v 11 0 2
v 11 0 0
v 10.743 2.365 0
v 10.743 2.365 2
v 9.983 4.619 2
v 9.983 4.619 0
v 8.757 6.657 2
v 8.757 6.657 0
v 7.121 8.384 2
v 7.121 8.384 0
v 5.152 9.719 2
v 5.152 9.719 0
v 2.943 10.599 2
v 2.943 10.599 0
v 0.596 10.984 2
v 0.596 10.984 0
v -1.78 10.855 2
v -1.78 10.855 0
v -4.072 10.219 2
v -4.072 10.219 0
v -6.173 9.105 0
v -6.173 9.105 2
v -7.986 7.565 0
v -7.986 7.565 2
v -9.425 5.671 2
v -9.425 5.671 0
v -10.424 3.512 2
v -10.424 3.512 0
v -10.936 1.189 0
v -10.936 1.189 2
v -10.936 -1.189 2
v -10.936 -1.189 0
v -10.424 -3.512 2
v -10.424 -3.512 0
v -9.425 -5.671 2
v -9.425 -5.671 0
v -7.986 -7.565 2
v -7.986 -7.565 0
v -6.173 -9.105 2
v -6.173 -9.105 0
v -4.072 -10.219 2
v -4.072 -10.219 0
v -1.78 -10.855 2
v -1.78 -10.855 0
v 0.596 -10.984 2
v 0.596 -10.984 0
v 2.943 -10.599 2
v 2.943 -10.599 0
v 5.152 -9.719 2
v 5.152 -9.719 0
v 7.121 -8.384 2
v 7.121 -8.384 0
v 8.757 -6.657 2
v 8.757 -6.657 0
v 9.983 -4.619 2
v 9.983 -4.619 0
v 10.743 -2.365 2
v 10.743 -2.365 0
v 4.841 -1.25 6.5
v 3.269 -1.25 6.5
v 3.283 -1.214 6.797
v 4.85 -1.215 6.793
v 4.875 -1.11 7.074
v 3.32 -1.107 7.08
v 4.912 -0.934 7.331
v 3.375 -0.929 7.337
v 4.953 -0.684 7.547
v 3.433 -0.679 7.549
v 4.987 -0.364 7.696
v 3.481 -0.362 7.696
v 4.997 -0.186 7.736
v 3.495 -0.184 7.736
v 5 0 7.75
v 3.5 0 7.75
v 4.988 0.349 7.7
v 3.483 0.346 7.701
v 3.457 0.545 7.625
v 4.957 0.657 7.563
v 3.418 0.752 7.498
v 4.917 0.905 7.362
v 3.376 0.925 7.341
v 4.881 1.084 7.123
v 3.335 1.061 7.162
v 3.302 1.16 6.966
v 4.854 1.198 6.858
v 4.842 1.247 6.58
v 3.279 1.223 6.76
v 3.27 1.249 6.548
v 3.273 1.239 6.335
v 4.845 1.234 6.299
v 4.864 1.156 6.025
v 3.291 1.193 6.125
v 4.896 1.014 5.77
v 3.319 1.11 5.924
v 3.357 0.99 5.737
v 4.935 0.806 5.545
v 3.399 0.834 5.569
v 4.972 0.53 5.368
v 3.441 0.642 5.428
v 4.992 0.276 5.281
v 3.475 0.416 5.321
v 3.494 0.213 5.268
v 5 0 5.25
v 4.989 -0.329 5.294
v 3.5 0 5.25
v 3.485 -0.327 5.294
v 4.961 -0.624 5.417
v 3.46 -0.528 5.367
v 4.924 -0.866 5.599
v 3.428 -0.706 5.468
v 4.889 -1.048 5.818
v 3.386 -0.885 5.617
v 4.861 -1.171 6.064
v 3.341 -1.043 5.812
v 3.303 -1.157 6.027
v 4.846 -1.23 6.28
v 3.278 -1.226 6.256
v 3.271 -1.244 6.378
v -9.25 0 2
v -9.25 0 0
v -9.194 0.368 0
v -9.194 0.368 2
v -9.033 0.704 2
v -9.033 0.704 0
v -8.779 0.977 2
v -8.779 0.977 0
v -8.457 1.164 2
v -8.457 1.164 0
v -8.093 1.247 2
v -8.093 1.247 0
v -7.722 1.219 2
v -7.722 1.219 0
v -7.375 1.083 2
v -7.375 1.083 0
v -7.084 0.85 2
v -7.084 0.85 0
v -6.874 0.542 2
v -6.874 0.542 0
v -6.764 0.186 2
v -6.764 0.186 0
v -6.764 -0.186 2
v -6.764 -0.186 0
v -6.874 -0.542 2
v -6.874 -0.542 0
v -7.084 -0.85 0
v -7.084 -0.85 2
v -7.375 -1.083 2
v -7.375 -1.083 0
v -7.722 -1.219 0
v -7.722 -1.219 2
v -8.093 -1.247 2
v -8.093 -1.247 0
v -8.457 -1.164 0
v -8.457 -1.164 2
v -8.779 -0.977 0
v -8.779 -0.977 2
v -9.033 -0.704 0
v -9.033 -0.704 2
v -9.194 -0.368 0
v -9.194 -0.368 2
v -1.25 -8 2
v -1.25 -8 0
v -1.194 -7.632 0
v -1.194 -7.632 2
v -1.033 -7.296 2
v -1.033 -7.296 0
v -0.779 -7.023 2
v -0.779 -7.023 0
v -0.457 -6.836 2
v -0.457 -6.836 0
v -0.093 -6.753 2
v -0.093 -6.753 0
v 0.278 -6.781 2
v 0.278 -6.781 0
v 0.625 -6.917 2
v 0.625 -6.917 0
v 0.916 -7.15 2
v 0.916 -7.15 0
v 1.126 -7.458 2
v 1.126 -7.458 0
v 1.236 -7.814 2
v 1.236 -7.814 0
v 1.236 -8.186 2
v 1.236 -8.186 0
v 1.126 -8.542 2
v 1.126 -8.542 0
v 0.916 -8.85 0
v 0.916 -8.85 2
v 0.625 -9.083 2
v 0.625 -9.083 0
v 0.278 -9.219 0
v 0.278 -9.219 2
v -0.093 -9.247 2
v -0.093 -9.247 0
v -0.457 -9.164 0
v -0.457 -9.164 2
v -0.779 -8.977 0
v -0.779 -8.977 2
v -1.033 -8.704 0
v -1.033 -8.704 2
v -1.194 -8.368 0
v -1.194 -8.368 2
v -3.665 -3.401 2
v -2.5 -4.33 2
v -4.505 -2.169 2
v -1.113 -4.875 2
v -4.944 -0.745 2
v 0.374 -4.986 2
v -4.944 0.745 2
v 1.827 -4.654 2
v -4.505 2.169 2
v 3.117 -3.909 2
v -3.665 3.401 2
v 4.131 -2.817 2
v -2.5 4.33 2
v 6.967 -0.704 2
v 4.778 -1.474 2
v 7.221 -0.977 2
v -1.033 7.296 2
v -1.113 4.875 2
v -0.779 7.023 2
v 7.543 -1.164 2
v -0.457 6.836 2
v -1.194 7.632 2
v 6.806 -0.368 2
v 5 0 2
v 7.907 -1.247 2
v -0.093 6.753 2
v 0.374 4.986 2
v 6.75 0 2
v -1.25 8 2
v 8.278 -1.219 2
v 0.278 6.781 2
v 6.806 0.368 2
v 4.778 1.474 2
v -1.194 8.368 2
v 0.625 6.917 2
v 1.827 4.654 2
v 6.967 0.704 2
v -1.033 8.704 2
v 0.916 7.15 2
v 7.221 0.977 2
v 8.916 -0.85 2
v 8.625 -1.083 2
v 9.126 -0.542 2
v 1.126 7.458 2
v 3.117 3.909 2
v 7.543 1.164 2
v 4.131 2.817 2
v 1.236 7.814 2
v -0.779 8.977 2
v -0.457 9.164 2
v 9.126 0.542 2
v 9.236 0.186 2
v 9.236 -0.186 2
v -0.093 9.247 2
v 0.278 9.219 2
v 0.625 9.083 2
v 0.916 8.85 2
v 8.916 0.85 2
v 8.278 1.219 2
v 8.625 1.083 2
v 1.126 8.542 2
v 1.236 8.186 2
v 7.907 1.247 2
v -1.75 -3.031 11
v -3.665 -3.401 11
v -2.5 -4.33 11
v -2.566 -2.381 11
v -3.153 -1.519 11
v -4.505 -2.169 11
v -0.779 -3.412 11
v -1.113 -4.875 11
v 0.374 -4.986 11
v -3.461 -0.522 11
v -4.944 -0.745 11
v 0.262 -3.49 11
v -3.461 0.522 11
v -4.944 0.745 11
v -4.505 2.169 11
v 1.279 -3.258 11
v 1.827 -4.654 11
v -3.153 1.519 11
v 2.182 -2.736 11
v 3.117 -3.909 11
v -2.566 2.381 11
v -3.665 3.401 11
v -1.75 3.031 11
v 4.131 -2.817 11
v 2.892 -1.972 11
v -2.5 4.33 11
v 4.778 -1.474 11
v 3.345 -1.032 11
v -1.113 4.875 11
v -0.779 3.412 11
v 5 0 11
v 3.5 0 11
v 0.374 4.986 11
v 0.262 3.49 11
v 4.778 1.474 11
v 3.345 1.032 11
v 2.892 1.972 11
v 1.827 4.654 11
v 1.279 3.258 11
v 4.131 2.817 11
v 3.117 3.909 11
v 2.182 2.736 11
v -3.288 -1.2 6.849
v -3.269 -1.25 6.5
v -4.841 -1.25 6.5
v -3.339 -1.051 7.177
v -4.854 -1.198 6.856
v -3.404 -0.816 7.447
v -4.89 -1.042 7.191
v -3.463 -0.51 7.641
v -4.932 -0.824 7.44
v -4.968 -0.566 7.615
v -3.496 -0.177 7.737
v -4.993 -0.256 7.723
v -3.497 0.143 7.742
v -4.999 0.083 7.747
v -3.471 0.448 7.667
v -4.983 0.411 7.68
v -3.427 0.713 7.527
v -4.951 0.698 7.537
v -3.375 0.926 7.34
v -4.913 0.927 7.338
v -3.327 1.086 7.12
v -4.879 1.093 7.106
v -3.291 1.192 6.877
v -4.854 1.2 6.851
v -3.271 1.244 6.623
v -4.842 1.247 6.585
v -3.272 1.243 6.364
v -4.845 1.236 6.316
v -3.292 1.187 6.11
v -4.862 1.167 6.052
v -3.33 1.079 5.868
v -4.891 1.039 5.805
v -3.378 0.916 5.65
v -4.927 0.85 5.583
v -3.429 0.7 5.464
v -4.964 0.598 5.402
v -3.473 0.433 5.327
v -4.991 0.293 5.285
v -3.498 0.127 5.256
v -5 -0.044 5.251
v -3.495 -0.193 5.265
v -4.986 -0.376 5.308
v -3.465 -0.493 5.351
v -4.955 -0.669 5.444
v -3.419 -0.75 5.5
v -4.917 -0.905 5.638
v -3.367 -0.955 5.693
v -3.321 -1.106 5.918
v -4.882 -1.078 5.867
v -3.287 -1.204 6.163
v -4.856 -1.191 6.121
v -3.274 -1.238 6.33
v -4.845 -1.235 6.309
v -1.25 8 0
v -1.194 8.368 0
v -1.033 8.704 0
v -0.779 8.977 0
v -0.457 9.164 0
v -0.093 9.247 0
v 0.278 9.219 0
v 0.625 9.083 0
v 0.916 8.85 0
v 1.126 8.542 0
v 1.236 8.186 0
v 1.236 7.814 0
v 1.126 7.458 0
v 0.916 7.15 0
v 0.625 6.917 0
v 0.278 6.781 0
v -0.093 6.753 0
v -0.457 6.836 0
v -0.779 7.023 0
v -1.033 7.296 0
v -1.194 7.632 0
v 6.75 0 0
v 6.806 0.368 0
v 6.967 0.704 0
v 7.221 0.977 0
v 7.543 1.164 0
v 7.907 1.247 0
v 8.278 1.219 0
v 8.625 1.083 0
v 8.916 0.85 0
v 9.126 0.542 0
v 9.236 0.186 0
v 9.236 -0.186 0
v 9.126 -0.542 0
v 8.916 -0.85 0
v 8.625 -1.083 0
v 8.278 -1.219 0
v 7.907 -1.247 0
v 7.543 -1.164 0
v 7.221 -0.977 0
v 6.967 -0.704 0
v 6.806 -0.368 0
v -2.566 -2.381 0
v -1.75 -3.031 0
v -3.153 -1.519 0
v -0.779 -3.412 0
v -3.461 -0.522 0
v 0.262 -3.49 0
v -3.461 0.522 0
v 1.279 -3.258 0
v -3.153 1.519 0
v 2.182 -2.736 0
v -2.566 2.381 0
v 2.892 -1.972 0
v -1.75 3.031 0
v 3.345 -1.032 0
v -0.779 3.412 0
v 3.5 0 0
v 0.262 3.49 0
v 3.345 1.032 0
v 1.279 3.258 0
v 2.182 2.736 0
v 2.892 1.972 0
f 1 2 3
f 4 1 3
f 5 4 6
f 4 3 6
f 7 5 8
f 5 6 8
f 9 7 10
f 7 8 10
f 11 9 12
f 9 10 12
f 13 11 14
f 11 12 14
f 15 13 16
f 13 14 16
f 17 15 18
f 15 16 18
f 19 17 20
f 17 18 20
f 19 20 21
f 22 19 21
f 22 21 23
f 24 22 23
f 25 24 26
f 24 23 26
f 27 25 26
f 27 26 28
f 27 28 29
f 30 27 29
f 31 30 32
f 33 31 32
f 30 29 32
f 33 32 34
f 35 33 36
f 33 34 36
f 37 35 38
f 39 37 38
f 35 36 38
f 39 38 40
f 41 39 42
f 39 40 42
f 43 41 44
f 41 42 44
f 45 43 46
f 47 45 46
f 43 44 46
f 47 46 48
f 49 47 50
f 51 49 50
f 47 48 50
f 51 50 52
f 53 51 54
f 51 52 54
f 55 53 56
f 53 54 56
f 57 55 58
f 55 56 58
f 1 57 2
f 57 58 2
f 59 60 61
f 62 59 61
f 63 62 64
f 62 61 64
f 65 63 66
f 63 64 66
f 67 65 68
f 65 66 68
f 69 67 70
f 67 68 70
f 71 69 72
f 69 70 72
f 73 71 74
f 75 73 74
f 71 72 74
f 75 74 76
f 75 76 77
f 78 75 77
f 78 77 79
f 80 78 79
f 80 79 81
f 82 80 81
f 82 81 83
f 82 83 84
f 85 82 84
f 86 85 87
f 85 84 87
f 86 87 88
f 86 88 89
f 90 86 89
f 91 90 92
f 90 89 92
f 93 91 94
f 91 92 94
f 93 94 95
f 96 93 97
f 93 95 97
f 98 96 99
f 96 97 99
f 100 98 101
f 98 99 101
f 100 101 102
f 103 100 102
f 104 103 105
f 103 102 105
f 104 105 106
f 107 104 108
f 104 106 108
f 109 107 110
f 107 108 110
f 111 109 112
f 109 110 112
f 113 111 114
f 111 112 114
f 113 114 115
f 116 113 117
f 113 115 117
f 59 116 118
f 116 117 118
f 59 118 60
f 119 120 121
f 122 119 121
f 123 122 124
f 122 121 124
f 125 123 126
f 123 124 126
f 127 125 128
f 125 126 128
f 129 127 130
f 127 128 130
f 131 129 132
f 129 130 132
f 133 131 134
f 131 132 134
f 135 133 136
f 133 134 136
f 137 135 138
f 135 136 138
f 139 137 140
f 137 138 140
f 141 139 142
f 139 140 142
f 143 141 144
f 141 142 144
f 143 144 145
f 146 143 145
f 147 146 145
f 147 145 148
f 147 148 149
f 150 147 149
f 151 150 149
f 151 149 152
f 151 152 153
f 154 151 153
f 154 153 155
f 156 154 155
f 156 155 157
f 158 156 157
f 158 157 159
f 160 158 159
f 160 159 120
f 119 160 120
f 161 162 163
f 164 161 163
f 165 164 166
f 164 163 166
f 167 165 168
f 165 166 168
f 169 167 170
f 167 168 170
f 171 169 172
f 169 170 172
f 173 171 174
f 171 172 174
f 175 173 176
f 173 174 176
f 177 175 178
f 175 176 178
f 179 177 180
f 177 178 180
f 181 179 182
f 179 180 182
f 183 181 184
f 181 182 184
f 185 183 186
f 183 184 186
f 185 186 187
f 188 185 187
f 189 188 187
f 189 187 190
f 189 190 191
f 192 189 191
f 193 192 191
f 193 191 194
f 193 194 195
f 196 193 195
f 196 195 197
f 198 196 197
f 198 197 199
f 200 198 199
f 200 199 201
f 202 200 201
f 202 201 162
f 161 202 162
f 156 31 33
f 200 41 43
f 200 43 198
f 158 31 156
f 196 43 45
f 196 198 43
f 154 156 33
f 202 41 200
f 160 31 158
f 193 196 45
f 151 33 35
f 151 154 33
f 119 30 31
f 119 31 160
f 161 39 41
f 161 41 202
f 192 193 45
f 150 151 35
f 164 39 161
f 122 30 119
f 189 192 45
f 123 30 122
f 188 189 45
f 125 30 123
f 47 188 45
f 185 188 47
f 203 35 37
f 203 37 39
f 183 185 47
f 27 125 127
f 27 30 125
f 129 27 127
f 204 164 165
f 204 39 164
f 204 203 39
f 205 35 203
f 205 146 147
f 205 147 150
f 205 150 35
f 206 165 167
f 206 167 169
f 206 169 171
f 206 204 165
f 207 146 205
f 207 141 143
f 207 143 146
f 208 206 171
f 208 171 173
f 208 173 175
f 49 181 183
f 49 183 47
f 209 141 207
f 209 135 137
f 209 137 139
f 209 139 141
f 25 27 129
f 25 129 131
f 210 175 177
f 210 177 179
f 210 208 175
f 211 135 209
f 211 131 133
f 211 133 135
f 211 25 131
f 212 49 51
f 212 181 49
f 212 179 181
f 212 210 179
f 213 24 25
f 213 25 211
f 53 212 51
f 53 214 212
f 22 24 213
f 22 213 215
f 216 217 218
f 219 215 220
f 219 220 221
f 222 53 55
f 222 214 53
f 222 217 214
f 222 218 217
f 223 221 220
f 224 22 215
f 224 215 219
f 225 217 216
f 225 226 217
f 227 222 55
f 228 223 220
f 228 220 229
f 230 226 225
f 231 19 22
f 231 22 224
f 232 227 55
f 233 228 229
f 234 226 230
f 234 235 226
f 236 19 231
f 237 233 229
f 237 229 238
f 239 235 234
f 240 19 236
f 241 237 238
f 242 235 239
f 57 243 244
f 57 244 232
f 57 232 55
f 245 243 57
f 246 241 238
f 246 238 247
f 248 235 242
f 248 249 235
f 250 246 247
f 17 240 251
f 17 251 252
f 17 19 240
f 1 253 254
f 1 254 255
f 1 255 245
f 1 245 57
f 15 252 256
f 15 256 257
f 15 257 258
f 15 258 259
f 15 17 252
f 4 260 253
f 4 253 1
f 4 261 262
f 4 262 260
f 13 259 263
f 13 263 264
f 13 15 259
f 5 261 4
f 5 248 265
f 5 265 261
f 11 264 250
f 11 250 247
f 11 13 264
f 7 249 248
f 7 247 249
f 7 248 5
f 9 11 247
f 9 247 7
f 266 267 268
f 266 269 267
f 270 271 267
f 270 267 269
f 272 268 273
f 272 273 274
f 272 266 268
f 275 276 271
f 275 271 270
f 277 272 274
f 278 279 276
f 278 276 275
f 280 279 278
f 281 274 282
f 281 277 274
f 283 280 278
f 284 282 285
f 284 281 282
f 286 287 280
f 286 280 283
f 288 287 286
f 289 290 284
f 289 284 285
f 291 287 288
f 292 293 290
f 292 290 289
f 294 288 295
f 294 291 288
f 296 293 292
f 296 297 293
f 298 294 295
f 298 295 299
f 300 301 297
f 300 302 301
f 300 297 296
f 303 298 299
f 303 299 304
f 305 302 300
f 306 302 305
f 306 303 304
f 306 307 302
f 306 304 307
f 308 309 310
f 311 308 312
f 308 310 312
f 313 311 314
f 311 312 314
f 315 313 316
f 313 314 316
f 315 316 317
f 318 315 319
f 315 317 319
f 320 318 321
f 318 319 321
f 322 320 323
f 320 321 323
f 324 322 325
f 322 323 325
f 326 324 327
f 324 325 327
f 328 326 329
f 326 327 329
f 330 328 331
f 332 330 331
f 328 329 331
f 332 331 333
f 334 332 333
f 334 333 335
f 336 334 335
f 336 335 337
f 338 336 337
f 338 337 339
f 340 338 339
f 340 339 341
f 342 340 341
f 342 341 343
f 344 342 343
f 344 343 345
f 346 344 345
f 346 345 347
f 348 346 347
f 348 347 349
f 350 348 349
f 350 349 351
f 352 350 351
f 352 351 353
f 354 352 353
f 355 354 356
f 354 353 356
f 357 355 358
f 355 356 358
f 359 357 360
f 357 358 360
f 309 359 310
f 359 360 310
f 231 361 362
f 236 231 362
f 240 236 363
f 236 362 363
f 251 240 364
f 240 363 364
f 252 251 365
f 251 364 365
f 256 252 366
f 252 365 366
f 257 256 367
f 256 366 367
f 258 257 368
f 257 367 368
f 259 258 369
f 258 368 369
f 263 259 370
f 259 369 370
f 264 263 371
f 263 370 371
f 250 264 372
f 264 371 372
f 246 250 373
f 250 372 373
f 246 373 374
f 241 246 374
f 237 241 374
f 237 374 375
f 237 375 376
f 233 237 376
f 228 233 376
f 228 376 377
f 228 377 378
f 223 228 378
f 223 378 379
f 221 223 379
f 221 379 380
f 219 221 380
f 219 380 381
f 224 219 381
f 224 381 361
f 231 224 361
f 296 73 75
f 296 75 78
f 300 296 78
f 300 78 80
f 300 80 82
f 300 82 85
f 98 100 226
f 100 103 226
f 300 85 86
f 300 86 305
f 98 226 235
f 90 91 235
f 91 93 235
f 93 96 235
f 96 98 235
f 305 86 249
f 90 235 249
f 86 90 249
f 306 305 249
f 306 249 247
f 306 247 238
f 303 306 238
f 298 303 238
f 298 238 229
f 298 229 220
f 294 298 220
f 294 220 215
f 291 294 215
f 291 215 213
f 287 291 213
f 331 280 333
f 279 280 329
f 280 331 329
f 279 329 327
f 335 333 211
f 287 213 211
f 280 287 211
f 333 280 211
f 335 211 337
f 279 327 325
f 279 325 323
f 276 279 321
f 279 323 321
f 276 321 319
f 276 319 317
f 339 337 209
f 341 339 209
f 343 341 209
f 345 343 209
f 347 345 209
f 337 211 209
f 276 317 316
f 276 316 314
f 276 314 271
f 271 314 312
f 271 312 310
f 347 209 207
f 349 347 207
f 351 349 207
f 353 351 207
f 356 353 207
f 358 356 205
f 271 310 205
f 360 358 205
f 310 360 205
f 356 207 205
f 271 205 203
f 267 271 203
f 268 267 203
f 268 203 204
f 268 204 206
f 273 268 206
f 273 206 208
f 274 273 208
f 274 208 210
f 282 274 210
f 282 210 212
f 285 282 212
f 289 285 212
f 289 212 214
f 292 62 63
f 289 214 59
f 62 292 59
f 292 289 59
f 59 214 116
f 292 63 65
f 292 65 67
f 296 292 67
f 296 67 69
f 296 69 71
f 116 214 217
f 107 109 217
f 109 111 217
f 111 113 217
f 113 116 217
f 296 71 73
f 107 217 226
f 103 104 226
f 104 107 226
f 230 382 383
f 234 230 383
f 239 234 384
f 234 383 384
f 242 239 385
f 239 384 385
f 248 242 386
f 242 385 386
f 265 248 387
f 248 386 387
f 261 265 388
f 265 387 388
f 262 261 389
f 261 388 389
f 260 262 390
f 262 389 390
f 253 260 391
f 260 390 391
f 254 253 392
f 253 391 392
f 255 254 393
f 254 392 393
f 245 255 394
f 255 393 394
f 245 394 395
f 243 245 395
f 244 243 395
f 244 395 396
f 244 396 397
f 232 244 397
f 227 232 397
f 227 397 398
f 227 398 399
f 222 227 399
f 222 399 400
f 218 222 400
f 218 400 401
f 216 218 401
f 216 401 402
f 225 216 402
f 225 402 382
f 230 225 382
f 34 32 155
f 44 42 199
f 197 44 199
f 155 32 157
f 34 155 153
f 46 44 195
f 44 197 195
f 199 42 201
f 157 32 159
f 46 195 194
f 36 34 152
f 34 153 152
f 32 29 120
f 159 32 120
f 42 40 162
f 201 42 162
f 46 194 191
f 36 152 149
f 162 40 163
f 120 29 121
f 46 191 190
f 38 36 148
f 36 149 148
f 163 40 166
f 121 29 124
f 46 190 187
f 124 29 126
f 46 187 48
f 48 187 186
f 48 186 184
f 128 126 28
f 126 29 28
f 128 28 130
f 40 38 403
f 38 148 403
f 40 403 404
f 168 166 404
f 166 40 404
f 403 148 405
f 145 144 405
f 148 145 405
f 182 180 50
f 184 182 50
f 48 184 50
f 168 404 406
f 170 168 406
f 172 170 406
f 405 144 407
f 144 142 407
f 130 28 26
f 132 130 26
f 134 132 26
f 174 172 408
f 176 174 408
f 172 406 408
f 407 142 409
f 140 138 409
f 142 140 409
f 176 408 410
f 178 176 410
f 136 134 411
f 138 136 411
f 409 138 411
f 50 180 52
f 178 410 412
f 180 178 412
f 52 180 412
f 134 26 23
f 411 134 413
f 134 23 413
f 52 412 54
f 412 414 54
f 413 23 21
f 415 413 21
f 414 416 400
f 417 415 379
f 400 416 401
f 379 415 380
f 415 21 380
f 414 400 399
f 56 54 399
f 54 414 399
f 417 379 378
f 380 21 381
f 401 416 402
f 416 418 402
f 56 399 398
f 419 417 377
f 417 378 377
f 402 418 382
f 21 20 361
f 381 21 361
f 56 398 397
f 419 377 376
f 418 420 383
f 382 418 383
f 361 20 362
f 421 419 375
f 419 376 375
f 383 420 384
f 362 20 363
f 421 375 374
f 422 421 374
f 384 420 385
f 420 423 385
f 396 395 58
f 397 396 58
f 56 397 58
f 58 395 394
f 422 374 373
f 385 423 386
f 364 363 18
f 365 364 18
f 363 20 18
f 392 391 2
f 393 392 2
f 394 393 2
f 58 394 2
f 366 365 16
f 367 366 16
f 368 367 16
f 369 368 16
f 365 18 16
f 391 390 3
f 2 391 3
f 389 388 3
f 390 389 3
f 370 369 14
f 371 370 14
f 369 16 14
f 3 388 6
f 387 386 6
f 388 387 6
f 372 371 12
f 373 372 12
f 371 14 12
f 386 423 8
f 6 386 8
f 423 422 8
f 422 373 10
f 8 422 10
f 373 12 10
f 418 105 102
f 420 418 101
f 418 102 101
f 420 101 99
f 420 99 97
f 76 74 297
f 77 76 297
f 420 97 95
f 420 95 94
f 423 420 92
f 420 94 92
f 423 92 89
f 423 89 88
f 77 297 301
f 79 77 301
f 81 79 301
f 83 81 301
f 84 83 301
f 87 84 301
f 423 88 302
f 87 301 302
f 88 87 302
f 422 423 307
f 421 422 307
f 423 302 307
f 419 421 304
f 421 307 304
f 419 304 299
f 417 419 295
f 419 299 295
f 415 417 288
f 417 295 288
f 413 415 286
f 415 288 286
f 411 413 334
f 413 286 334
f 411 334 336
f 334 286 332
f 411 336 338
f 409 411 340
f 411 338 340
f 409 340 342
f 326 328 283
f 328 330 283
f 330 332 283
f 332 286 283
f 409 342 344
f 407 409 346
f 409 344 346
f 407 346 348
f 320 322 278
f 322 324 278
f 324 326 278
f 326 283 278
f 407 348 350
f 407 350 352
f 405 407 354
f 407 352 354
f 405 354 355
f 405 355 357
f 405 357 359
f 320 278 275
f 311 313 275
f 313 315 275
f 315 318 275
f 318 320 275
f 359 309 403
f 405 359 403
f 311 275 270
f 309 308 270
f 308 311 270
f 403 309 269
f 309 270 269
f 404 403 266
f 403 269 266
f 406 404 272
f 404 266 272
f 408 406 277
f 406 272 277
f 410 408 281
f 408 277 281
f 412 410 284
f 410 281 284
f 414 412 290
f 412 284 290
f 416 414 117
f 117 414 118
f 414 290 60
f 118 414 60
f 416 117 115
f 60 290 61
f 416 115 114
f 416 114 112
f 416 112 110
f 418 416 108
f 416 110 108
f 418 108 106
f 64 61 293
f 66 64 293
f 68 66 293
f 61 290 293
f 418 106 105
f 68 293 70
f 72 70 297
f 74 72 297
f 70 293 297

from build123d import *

# Parameters (mm, degrees)
F0_R     = 11
F1_DEPTH = 2
F2_R     = 5
F2_R_2   = 3.5
F3_DEPTH = 9
F4_R     = 3.5
F5_DEPTH = 2
F7_D     = 2.5
F10_D    = 2.5


with BuildPart() as f1:
    # F0 (on Top) → F1 (new body)
    with BuildSketch(Plane.XY):
        Circle(F0_R)
    extrude(amount=F1_DEPTH)

    # F2 (on face) → F3 (join)
    with BuildSketch(Plane.XY.offset(2)):
        Circle(F2_R)
        Circle(F2_R_2, mode=Mode.SUBTRACT)
    extrude(amount=F3_DEPTH)

    # F4 (on face) → F5 (cut, through all)
    with BuildSketch(Plane.XY.offset(2)):
        Circle(F4_R)
    extrude(amount=-F5_DEPTH, mode=Mode.SUBTRACT)

    # F7 (through all)
    with Locations(Plane.XY.offset(2)):
        with Locations((0, 8), (8, 0), (0, -8), (-8, 0)):
            Hole(F7_D / 2)

    # F10 (through all)
    with Locations(Plane.YZ.offset(5)):
        with Locations((0, 6.5)):
            Hole(F10_D / 2)


solid = f1.part
